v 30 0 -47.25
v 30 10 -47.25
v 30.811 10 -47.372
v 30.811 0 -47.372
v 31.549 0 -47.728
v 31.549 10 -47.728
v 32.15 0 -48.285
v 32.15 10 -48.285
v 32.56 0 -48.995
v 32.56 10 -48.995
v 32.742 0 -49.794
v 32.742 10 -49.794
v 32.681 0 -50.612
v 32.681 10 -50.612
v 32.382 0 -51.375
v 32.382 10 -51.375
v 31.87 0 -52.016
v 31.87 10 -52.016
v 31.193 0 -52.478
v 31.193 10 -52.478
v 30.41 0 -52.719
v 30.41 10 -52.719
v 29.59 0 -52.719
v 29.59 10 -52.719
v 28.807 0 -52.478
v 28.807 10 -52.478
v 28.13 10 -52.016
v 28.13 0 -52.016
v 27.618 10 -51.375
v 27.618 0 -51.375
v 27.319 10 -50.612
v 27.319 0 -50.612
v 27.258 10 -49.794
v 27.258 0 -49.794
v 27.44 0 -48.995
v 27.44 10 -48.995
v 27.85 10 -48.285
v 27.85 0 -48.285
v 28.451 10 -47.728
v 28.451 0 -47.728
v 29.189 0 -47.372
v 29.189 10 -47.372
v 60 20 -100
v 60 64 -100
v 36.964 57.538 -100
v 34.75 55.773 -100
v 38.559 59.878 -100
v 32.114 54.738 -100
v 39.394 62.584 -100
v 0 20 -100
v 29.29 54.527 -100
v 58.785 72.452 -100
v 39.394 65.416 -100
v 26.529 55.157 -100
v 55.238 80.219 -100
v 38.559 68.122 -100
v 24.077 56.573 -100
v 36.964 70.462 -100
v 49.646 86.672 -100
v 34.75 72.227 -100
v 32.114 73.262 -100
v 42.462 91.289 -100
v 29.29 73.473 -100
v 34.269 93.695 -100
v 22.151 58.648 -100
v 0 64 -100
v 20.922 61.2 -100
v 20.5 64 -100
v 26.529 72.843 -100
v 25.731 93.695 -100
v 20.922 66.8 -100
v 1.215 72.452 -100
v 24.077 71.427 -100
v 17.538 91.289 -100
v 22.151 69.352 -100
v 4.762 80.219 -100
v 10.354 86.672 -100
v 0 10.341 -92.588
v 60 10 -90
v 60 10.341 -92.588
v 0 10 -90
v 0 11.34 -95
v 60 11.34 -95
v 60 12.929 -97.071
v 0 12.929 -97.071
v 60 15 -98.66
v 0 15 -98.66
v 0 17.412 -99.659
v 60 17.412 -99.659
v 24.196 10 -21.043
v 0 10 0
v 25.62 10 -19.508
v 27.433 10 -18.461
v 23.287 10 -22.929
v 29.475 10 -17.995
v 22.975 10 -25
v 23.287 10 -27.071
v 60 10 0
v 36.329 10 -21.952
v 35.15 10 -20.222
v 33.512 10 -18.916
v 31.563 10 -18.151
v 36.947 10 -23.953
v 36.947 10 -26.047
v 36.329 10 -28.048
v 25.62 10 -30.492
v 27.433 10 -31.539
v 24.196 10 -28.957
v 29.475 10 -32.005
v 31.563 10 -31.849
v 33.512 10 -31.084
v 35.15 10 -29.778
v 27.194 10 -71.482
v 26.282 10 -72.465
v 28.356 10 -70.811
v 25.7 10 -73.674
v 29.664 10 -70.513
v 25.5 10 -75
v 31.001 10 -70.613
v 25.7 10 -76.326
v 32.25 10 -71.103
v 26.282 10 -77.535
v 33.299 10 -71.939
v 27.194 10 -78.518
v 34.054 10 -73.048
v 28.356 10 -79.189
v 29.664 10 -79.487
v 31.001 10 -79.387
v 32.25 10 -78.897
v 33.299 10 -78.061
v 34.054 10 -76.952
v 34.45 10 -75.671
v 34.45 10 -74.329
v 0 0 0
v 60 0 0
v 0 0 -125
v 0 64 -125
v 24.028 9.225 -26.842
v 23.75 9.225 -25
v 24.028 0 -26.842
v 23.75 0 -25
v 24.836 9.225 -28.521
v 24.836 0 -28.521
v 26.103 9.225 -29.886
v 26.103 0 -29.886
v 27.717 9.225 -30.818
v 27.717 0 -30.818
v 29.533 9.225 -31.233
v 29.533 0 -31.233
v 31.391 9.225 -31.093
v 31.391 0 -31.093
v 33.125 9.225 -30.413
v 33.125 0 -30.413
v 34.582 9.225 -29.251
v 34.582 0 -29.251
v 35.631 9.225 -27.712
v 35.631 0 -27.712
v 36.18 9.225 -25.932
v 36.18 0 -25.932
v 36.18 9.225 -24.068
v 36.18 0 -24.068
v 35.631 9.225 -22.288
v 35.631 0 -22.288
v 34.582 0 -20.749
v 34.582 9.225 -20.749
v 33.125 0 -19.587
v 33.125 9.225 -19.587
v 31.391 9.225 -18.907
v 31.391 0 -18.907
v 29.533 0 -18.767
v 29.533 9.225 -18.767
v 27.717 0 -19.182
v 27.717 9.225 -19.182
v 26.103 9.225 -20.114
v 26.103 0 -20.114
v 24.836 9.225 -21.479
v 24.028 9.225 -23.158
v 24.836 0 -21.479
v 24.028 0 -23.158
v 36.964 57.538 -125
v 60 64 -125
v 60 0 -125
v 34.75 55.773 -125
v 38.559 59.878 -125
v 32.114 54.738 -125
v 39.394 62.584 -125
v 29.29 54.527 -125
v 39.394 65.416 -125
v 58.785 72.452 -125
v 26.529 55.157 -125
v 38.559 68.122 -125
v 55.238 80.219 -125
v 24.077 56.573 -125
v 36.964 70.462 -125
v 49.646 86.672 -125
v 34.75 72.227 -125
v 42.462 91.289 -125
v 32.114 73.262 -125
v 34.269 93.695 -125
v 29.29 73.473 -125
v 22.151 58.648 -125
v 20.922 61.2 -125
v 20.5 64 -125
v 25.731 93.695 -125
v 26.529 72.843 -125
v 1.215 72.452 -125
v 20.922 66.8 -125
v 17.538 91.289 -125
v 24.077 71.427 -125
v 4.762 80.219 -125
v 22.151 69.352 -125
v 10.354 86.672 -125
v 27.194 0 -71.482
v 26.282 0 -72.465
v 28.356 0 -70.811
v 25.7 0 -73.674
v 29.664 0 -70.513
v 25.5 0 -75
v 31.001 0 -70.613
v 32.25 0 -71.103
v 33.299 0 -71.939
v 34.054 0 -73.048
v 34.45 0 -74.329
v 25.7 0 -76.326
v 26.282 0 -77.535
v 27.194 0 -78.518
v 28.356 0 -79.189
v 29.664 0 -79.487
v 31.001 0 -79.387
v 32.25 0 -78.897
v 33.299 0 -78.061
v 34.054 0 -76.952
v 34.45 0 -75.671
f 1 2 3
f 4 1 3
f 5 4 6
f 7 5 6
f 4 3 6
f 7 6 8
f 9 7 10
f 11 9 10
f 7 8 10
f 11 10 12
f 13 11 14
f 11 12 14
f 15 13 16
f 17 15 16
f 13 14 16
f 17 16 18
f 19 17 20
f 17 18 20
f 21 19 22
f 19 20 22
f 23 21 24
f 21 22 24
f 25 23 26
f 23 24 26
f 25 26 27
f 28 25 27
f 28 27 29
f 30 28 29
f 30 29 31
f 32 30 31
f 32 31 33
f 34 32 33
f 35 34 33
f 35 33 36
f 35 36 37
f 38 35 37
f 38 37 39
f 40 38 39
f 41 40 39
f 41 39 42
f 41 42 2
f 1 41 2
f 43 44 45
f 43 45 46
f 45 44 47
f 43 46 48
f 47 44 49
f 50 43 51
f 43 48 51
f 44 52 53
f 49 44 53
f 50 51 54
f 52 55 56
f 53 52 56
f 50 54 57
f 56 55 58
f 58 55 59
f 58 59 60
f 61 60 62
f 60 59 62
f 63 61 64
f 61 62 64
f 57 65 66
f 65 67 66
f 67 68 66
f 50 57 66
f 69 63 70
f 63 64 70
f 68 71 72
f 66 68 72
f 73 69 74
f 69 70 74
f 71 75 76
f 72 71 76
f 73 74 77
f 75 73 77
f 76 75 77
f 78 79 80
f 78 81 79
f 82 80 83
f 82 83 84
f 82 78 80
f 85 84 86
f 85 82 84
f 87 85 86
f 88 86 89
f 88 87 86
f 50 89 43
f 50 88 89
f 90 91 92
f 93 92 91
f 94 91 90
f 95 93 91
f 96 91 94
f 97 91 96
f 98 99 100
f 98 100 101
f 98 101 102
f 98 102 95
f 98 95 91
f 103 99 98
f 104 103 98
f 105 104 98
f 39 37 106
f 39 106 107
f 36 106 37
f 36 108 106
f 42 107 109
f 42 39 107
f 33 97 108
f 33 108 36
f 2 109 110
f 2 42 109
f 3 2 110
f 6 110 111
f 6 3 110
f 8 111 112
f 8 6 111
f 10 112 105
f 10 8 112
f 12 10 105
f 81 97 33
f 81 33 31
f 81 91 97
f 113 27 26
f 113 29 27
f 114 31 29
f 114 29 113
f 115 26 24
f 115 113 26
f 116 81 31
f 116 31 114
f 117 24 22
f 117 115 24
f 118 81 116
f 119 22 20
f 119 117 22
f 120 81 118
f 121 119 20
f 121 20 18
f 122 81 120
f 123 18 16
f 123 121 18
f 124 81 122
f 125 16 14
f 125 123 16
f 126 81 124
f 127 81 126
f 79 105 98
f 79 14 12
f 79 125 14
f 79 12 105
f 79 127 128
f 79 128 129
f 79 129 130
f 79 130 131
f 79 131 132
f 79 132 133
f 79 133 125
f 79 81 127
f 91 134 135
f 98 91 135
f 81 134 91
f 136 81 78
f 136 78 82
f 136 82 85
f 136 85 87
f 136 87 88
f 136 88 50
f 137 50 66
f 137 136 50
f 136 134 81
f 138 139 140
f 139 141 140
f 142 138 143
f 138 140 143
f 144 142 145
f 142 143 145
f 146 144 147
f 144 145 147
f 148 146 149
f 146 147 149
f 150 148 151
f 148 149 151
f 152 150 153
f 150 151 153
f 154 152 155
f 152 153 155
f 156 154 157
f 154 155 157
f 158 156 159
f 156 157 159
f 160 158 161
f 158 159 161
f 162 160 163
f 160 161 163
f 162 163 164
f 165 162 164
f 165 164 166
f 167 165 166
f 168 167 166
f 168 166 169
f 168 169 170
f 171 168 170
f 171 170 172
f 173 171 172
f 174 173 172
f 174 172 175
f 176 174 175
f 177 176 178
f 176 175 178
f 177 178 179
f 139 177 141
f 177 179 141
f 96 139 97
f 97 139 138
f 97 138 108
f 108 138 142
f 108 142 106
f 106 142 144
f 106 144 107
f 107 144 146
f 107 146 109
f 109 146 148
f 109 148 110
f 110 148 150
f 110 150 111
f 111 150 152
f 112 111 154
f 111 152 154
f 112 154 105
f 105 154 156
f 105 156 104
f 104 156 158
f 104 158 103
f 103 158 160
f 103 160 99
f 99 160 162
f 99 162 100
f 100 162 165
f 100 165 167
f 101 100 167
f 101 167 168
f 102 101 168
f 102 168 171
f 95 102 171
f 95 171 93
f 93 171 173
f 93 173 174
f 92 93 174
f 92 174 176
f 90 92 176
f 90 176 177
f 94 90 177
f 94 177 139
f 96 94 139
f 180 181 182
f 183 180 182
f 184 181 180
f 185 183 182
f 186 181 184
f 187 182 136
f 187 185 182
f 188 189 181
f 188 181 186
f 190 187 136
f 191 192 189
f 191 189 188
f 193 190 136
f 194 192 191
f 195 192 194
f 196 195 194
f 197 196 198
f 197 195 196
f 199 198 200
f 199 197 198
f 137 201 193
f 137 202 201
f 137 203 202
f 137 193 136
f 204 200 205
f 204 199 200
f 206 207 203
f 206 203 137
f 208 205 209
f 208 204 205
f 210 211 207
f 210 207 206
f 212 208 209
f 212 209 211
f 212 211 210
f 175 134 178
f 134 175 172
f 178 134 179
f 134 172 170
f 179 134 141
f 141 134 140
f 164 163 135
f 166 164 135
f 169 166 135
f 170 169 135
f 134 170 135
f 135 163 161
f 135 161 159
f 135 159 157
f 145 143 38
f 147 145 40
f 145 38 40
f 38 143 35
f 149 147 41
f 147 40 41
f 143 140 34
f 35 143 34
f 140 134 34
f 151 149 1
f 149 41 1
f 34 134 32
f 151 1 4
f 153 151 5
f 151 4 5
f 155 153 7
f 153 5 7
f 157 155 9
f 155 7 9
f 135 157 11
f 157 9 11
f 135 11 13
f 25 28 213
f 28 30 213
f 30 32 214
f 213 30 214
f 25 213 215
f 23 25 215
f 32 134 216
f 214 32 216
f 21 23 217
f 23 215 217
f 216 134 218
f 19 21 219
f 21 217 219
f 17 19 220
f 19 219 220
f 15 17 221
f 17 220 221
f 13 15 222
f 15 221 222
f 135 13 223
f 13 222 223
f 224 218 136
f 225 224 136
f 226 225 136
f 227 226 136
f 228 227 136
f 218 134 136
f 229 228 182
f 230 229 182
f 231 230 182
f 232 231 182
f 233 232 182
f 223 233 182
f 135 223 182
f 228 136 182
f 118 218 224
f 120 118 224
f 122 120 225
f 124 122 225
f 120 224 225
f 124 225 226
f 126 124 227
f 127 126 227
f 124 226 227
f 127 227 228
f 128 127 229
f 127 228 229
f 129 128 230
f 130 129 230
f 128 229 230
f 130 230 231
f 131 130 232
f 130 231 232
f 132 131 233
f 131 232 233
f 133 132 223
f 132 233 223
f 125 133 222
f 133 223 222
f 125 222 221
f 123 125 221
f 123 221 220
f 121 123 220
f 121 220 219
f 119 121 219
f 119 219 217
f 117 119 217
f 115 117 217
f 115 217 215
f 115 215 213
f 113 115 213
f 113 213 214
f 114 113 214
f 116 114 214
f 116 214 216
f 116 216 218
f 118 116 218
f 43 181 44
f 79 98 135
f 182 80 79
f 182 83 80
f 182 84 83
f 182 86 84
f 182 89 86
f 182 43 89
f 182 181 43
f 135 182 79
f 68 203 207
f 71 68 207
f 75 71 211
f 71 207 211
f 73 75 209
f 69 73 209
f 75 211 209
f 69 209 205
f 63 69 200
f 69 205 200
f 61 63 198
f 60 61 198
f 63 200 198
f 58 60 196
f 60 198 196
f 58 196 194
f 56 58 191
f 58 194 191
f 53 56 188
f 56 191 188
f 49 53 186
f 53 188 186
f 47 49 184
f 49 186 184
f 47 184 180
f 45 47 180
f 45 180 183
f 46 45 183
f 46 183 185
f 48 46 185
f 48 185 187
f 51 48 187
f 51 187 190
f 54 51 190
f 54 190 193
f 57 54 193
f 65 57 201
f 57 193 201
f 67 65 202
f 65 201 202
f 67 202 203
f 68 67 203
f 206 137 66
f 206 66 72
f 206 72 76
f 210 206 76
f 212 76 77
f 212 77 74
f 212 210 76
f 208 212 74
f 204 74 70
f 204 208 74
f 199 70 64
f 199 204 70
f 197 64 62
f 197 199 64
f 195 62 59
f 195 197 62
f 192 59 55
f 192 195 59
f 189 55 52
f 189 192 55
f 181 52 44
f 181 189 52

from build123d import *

# Parameters (mm, degrees)
SKETCH1_W                        = 60
SKETCH1_H                        = 125
BOSS_EXTRUDE1_DEPTH              = 10
SKETCH2_R                        = 9.5
BOSS_EXTRUDE2_DEPTH              = 25
CUT_EXTRUDE1_REACH               = 164.114
SKETCH3_R                        = 2.75
M10X1_0_TAPPED_HOLE1_D           = 9
M14X1_5_TAPPED_HOLE1_D           = 12.5
M14X1_5_TAPPED_HOLE1_CSINK_D     = 14.05
M14X1_5_TAPPED_HOLE1_CSINK_ANGLE = 90
FILLET1_R                        = 10


with BuildPart() as part:
    # Sketch1 → Boss-Extrude1 (new body)
    with BuildSketch(Plane(origin=(0, 0, 0), x_dir=(1, 0, 0), z_dir=(0, 1, 0))):
        with Locations((30, 62.5)):
            Rectangle(SKETCH1_W, SKETCH1_H)
    extrude(amount=BOSS_EXTRUDE1_DEPTH)

    # Sketch2 → Boss-Extrude2 (add)
    with BuildSketch(Plane(origin=(0, 0, -125), x_dir=(-1, 0, 0), z_dir=(0, 0, -1))):
        with BuildLine():
            Line((-60, 10), (0, 10))
            Line((0, 10), (0, 64))
            ThreePointArc((0, 64), (-30, 94), (-60, 64))
            Line((-60, 64), (-60, 10))
        make_face()
        with Locations((-30, 64)):
            Circle(SKETCH2_R, mode=Mode.SUBTRACT)
    extrude(amount=-BOSS_EXTRUDE2_DEPTH)

    # Sketch3 → Cut-Extrude1 (cut, up to next)
    with BuildSketch(Plane(origin=(0, 10, 0), x_dir=(1, 0, 0), z_dir=(0, 1, 0)), mode=Mode.PRIVATE) as cut_extrude1_sk1:
        with Locations(Location((30, 50, 0), (0, 0, 270))):
            Circle(SKETCH3_R)
    cut_extrude1_tool1 = extrude(cut_extrude1_sk1.sketch, amount=-CUT_EXTRUDE1_REACH, mode=Mode.PRIVATE) & part.part
    add(cut_extrude1_tool1.solids().sort_by_distance((30, 10, -50))[0], mode=Mode.SUBTRACT)

    # M10x1.0 Tapped Hole1 (through all)
    with Locations(Plane(origin=(0, 10, 0), x_dir=(1, 0, 0), z_dir=(0, 1, 0))):
        with Locations((30, 75)):
            Hole(M10X1_0_TAPPED_HOLE1_D / 2)

    # M14x1.5 Tapped Hole1 (through all)
    with Locations(Plane(origin=(0, 10, 0), x_dir=(1, 0, 0), z_dir=(0, 1, 0))):
        with Locations((30, 25)):
            CounterSinkHole(M14X1_5_TAPPED_HOLE1_D / 2, M14X1_5_TAPPED_HOLE1_CSINK_D / 2, counter_sink_angle=M14X1_5_TAPPED_HOLE1_CSINK_ANGLE)

    # Fillet1
    fillet1_edges = [part.edges().sort_by_distance(p)[0] for p in [
        (30, 10, -100),
    ]]
    fillet(fillet1_edges, radius=FILLET1_R)


solid = part.part
